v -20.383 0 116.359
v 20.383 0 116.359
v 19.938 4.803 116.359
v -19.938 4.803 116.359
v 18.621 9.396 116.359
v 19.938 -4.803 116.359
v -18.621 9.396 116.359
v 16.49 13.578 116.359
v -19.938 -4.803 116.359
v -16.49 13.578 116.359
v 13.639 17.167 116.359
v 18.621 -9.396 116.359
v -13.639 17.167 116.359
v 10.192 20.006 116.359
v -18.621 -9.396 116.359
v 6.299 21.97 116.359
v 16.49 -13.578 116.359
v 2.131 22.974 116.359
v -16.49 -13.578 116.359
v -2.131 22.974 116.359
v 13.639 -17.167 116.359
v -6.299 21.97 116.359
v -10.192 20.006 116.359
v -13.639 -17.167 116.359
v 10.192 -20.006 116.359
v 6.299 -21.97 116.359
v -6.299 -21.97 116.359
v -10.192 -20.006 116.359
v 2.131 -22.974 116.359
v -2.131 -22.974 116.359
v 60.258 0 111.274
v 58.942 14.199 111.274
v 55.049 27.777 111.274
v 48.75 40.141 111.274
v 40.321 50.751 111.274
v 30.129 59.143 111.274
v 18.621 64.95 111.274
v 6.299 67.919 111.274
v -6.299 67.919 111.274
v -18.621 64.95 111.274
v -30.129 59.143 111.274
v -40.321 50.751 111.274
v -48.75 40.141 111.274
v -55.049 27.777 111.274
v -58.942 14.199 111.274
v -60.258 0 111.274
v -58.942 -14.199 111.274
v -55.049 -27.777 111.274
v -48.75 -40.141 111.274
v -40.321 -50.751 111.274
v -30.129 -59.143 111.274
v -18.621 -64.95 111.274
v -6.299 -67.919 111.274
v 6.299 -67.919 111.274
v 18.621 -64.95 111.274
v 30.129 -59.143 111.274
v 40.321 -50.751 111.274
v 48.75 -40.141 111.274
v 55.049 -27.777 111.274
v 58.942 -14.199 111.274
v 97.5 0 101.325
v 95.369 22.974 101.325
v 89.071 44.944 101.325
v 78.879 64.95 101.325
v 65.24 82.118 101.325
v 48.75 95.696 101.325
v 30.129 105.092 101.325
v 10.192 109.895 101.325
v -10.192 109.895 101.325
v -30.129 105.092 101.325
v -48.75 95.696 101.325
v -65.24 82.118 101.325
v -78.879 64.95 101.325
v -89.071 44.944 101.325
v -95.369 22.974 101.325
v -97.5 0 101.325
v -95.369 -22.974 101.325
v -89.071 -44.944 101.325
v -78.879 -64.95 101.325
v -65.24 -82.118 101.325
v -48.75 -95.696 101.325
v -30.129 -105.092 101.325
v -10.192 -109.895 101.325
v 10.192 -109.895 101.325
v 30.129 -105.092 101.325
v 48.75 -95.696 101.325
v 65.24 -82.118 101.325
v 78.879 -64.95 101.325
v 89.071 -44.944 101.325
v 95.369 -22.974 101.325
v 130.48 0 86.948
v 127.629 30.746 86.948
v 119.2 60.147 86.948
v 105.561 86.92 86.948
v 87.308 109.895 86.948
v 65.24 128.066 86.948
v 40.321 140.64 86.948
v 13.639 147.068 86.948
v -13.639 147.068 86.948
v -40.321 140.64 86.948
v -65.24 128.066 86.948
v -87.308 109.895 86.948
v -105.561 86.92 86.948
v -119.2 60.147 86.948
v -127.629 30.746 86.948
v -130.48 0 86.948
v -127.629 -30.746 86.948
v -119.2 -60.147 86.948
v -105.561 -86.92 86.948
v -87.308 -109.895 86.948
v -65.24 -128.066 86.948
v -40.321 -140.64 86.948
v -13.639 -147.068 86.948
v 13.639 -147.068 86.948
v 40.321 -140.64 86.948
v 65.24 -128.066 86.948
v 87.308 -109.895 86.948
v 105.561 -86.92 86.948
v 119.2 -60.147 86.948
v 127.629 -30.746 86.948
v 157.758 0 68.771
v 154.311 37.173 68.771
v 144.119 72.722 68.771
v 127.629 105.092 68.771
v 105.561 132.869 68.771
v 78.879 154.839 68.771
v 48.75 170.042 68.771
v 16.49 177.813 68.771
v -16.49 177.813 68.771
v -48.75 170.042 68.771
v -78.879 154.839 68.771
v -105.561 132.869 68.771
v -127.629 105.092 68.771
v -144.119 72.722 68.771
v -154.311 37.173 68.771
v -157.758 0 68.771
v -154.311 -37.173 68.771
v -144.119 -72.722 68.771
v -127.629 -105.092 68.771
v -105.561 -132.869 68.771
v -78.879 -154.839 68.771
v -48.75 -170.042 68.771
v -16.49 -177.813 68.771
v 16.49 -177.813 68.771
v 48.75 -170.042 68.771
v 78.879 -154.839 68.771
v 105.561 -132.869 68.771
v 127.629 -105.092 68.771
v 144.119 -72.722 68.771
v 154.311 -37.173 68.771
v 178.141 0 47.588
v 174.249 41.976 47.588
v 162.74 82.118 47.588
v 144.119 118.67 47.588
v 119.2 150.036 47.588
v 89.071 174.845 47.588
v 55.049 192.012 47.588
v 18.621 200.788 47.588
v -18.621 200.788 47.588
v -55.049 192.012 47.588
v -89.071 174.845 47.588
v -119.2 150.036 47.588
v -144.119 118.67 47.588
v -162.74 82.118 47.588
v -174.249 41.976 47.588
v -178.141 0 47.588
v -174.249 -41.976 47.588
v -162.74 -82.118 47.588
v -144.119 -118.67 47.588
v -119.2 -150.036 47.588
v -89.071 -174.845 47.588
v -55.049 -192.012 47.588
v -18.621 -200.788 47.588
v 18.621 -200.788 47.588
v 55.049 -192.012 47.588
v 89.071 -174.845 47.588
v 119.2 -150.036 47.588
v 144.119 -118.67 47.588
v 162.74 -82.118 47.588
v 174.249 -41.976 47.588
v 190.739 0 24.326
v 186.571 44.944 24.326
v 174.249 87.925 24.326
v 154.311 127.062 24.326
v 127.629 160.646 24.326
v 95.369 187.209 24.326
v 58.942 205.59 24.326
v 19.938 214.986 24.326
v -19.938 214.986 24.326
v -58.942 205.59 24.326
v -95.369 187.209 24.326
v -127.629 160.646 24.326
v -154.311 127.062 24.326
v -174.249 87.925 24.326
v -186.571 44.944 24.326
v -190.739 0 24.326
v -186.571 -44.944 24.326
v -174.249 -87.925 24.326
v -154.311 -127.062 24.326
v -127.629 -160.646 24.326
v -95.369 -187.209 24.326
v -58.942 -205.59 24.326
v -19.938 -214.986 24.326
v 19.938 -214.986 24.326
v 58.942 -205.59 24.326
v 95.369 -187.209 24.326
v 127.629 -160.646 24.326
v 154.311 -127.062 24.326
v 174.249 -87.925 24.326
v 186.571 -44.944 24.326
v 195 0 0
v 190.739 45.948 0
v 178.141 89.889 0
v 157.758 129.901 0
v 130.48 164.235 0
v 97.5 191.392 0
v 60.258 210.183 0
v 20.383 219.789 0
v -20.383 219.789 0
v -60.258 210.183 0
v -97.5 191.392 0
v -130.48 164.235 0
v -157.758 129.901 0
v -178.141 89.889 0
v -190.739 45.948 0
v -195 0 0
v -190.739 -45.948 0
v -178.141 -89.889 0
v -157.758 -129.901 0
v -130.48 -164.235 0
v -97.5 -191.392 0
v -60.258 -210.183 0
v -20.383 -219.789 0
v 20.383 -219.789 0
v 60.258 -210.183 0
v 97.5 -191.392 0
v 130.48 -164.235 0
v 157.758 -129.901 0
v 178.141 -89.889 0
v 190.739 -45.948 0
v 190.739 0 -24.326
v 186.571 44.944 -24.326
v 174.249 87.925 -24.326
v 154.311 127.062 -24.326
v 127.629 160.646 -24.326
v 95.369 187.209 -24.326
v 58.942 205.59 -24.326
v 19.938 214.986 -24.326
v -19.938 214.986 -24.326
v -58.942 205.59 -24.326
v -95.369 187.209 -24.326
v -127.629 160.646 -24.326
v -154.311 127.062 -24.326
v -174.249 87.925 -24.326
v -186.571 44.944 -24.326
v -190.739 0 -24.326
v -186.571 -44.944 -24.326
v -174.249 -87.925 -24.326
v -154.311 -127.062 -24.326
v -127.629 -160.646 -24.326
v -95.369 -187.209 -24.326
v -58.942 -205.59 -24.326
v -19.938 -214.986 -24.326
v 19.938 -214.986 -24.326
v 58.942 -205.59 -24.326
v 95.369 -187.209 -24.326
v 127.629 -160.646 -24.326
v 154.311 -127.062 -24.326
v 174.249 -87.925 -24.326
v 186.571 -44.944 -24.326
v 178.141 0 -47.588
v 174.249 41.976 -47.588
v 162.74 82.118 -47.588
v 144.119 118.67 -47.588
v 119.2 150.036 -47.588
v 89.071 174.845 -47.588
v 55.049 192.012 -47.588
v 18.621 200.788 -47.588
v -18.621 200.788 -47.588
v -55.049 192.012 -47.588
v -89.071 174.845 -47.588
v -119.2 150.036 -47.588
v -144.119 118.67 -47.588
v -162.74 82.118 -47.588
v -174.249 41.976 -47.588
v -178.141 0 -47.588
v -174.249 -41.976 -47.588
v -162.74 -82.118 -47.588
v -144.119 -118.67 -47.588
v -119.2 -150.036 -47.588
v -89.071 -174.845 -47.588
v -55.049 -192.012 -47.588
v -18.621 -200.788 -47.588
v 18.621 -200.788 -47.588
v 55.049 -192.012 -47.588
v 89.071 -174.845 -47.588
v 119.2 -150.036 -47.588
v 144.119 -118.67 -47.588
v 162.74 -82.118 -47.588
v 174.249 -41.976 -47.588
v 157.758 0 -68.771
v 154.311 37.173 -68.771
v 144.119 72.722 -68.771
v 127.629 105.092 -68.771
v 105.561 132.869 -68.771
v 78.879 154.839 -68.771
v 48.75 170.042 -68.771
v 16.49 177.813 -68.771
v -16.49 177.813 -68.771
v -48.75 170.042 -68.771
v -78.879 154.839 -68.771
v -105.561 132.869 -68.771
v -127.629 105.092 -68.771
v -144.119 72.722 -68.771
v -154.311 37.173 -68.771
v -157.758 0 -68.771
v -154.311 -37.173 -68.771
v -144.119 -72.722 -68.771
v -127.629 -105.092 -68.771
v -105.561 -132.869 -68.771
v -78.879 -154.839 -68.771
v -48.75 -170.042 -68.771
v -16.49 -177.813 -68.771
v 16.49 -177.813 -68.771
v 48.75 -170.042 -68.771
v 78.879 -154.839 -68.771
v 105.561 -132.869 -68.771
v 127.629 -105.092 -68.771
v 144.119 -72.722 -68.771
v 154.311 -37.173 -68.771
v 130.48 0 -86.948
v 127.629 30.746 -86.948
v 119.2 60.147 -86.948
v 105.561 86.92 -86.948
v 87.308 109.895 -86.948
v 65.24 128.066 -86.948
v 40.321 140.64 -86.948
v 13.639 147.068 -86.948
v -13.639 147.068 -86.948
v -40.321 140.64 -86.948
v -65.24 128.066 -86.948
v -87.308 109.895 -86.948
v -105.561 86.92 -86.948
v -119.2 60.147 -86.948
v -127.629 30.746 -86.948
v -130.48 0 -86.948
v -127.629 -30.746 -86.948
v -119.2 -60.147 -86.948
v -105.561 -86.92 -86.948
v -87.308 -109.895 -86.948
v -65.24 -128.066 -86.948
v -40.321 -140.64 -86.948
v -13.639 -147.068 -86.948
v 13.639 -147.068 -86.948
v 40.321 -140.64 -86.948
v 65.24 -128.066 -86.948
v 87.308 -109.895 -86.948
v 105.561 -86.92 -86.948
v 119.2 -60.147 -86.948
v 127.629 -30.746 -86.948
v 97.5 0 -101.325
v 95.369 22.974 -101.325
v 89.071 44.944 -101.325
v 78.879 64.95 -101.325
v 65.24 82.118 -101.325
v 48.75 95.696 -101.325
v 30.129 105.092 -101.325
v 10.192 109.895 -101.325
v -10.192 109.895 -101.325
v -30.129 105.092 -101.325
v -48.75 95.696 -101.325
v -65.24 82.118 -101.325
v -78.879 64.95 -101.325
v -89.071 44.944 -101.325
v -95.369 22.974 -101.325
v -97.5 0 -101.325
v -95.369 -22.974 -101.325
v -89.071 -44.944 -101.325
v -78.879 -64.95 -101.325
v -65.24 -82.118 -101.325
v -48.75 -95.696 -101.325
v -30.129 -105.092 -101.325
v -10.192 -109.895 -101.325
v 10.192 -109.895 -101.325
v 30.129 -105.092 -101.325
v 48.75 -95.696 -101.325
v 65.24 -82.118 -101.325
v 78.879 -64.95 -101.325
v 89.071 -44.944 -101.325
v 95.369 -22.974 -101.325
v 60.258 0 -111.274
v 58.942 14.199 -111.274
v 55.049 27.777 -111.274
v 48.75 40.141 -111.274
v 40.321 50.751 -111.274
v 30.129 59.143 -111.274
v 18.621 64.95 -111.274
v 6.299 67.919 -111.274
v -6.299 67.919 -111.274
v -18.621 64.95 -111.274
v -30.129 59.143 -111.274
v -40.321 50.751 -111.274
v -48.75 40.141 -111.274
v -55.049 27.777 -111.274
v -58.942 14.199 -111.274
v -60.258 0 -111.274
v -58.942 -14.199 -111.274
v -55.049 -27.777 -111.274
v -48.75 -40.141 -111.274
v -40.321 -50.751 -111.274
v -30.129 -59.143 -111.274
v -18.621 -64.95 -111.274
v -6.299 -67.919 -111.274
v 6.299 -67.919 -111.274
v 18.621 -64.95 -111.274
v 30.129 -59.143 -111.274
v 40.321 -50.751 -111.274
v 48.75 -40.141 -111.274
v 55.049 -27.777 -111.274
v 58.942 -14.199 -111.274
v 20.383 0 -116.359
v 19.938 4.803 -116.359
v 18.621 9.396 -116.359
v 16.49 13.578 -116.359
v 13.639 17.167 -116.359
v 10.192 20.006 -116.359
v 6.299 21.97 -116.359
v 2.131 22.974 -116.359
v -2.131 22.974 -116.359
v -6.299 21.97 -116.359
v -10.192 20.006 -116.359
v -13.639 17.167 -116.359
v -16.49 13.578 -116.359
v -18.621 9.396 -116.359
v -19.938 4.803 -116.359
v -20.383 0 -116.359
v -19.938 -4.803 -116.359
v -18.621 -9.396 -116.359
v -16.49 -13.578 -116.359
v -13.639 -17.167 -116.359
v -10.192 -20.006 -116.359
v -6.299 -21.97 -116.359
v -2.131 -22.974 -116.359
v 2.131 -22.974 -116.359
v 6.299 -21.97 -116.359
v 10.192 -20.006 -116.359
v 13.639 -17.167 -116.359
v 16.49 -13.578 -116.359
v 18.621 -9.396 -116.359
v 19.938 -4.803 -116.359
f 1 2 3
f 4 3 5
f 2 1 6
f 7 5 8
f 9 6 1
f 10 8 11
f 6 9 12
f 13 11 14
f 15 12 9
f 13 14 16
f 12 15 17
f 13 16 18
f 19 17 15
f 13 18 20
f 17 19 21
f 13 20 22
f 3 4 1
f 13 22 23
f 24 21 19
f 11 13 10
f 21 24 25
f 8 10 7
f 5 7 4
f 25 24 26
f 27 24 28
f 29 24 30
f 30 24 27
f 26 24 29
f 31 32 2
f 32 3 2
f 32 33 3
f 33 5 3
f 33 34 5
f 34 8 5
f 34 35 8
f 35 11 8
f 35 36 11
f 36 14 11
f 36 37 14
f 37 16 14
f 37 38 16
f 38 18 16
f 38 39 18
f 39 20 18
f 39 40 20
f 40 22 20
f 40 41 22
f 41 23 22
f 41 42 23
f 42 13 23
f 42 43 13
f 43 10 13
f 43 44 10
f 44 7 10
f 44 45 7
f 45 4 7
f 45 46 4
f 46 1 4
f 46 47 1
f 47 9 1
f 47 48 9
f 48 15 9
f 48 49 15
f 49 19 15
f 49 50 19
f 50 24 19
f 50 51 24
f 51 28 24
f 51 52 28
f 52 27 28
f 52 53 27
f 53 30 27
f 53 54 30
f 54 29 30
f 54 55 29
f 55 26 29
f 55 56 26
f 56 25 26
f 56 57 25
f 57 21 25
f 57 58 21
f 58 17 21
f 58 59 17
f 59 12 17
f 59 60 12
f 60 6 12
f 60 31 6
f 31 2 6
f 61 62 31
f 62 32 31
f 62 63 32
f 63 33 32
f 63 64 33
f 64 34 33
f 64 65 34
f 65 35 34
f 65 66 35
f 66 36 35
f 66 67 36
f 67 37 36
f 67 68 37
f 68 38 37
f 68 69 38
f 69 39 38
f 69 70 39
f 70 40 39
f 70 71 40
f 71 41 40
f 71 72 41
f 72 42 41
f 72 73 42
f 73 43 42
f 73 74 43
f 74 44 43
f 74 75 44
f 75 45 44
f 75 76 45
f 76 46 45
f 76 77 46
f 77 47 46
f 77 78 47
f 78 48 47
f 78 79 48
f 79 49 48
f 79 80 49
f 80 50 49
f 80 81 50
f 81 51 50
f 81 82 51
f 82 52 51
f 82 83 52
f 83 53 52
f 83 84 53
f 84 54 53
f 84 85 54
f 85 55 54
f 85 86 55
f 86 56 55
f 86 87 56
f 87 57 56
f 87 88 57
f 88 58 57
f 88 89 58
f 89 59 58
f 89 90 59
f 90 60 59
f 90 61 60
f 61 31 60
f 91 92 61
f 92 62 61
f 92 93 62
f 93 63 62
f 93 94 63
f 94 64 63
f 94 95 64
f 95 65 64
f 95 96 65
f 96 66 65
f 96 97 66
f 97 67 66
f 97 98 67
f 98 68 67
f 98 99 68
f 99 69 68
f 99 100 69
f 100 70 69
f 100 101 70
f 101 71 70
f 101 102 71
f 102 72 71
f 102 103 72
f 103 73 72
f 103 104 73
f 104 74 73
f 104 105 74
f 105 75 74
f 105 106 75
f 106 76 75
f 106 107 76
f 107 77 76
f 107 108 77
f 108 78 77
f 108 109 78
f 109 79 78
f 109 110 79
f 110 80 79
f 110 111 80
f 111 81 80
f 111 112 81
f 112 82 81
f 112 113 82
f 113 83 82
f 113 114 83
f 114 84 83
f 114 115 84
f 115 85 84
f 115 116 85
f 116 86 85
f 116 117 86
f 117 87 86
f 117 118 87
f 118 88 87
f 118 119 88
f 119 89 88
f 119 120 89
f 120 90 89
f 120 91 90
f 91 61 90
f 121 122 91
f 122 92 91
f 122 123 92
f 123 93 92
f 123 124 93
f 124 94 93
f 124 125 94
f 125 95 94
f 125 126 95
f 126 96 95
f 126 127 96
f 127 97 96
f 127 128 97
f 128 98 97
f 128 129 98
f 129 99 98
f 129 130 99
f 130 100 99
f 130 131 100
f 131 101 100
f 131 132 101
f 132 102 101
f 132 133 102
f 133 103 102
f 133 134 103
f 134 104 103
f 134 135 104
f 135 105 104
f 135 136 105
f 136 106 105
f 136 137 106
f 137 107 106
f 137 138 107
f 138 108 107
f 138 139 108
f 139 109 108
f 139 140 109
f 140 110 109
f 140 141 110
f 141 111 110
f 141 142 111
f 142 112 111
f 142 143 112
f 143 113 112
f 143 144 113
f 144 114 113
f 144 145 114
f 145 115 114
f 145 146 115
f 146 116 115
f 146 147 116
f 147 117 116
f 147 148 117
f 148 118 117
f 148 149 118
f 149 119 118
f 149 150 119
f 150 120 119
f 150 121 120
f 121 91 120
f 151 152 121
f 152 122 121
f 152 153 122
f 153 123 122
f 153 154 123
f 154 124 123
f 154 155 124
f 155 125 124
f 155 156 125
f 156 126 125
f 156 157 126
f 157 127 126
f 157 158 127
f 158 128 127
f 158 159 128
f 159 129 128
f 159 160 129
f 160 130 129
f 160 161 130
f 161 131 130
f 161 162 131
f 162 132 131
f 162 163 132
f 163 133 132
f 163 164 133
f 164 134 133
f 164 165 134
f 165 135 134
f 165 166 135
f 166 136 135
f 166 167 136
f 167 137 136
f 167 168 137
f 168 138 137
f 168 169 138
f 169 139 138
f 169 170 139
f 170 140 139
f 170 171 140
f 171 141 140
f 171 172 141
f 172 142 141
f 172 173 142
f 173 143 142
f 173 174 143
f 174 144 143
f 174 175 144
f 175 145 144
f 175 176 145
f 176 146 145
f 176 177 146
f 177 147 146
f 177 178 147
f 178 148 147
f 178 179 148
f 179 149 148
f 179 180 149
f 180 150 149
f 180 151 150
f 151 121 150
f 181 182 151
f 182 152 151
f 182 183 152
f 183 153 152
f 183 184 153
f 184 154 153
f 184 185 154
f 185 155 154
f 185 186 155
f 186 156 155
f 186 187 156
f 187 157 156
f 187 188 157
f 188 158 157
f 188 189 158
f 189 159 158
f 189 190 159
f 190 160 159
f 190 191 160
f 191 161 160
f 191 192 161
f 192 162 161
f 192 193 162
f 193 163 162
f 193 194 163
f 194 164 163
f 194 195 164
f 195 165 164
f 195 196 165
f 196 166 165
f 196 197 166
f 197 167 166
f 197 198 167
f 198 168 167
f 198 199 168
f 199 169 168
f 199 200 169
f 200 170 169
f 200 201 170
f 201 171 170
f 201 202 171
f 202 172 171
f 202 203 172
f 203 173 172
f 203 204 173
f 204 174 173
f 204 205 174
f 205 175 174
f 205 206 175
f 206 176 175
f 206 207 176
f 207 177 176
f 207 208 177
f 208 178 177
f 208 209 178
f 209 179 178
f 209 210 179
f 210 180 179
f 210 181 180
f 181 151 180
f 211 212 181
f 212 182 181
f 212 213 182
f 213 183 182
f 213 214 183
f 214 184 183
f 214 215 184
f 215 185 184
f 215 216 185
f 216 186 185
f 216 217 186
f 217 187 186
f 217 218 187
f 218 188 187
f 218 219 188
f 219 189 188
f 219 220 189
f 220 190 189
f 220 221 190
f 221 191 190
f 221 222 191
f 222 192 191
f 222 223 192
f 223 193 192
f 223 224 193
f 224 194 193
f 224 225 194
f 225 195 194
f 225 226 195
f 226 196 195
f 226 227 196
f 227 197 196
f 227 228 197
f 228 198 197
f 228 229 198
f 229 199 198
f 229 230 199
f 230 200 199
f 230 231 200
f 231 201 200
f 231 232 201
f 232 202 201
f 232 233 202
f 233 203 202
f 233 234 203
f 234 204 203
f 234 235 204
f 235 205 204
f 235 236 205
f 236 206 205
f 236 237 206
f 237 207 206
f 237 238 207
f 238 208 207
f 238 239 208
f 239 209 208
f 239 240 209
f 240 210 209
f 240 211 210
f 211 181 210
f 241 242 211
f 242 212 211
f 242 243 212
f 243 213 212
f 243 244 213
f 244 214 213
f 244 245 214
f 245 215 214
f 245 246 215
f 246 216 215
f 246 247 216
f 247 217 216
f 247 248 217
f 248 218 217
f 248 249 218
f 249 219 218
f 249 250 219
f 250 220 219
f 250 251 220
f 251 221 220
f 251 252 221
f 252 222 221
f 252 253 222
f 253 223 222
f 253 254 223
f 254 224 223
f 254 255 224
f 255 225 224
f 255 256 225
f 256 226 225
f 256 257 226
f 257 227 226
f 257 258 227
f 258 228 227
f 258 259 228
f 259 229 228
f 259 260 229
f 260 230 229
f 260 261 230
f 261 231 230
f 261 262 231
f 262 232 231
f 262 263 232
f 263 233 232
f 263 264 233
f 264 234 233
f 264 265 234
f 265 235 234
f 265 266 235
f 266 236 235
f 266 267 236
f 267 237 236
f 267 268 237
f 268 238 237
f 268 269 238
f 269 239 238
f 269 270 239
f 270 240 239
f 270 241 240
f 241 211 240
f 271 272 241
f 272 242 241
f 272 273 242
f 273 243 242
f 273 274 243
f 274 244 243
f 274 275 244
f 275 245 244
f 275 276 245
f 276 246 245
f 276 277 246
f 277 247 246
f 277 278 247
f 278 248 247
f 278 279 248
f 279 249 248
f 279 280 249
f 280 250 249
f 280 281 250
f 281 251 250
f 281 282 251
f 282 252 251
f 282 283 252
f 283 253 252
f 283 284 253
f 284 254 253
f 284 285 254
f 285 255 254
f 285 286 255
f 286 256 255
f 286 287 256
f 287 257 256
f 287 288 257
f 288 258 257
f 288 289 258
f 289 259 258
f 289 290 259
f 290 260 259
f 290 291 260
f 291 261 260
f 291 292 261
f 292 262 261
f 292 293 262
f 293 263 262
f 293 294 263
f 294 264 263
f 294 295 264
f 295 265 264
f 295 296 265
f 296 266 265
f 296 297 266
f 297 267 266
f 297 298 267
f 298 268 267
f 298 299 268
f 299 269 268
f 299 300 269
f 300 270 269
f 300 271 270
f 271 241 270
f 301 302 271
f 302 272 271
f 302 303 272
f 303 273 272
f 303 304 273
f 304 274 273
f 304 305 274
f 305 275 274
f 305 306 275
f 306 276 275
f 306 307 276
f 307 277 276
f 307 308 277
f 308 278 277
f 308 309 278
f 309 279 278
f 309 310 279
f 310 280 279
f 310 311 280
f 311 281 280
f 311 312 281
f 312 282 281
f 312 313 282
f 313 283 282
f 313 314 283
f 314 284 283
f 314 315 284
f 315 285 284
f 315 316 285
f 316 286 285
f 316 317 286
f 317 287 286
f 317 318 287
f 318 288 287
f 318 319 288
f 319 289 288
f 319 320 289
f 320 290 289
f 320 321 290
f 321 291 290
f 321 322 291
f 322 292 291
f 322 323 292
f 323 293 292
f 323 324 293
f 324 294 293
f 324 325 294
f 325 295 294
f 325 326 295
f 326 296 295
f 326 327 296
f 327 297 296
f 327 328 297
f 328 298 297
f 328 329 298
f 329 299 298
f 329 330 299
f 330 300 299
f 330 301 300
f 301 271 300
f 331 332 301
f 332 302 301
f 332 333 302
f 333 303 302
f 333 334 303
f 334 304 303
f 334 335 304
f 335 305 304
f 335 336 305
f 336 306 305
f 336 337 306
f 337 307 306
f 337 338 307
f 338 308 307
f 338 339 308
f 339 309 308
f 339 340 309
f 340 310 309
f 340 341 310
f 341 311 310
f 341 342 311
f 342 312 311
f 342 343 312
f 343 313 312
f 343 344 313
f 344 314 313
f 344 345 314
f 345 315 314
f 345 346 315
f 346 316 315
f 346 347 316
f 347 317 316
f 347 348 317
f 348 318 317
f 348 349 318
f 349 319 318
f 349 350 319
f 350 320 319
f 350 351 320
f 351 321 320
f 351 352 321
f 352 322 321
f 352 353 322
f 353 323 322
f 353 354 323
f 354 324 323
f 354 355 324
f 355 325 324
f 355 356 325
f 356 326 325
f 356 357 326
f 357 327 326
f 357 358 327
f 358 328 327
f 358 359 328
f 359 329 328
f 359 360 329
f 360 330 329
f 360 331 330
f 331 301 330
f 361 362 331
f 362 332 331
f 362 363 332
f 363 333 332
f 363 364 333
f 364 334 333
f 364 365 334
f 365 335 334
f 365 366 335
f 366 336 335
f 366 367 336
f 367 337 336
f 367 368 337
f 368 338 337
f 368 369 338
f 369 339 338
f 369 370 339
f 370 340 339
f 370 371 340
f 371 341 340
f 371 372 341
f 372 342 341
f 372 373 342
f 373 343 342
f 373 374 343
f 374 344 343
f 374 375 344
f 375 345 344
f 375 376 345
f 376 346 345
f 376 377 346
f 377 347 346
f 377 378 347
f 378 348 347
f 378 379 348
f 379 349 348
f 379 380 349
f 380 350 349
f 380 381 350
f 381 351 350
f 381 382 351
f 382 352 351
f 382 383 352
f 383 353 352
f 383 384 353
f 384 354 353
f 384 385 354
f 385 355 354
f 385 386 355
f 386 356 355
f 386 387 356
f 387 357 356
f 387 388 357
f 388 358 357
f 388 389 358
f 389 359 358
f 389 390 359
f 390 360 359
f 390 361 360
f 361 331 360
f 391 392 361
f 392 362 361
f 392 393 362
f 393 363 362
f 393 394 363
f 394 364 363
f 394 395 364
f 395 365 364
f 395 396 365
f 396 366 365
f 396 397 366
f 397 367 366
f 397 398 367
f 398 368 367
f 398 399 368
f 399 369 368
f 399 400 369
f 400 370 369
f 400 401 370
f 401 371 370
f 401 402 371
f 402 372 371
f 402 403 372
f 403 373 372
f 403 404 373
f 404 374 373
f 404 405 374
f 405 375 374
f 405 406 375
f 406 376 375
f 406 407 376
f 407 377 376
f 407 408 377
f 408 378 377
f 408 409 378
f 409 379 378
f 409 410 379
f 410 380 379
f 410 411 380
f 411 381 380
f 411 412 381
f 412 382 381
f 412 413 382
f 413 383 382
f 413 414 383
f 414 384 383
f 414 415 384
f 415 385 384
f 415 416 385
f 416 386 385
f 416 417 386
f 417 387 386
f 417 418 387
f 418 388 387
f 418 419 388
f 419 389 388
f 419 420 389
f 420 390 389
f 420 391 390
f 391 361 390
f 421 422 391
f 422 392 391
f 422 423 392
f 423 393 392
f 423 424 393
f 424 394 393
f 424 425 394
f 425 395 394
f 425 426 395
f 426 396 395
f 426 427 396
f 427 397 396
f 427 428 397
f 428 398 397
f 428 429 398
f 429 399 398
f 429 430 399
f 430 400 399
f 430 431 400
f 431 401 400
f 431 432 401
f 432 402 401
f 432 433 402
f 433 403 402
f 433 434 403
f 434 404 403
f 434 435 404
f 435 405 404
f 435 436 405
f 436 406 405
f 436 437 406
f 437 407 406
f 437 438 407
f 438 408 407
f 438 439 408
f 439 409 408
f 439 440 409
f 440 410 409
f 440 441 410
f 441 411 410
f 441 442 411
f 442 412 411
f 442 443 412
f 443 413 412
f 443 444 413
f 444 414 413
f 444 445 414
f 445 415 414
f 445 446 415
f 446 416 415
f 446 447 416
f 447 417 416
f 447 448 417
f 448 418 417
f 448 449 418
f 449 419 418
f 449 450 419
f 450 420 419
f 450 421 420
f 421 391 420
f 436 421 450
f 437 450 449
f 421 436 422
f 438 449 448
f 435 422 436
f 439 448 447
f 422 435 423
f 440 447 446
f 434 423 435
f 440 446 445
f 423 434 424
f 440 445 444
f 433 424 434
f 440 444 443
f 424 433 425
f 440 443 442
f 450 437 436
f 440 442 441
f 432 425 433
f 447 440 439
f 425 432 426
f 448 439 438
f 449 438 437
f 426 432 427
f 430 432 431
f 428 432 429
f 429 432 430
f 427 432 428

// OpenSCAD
// Generated by SolidPython 1.0.1 on 2020-07-29 00:46:52


scale(v = [15, 17, 9]) {
	sphere(r = 13);
}
/***********************************************
*********      SolidPython code:      **********
************************************************
 
# import packages: SolidPython
from solid import *
from solid.utils import *
from itertools import chain, combinations, permutations


class Resize:

    def __init__(self, scad_file):
        self.scad_file = scad_file
        #self.scad_file = import_scad(scad_file)
        # cone/cylinder param:
        self.r1 = 0
        self.r2 = 0
        self.h = 0
        # rectangular prism param:
        self.w = 0
        self.l = 0
        # ellipse param:
        self.r = 0

    # import OpenScad code (file name corresponds to shape)


    # classify shape + parameters
    def assign(self, param1, param2, param3):
        if self.scad_file == 'cone.scad':
            self.r1 = param1
            self.r2 = param2
            self.h = param3
        elif self.scad_file == 'cylinder.scad':
            self.r1 = param1
            self.r2 = param2
            self.h = param3
        elif self.scad_file == 'rectangularPrism.scad':
            self.h = param1
            self.l = param2
            self.w = param3
        else:
            self.r = param1
            self.h = param2

    # resize parameters
    def iterate(self):
        x = range(3, 20, 2)
        i = 1
        if self.scad_file == 'cone.scad':
            tempList = list(permutations(x, 2))
            for temp in tempList:
                param1 = temp[0]
                param2 = temp[1]
                filepath = 'produced_scad_files/' + 'cone' + str(param1) + '_' + str(param2) + '_' + '.scad'
                scad_render_to_file(cylinder(h=param1, r1=param2, r2=0), filepath)

        elif self.scad_file == 'cylinder.scad':
            tempList = list(permutations(x, 3))
            for temp in tempList:
                param1 = temp[0]
                param2 = temp[1]
                filepath = 'produced_scad_files/' + 'cylinder' + str(param1) + '_' + str(param2) + '_' + '.scad'
                scad_render_to_file(cylinder(h=param1, r1=param2, r2=param2), filepath)

        elif self.scad_file == 'rectangularPrism.scad':
            tempList = list(permutations(x, 3))
            for temp in tempList:
                param1 = temp[0]
                param2 = temp[1]
                param3 = temp[2]
                filepath = 'produced_scad_files/' + 'rectangularPrism' + str(param1) + '_' + str(param2) + '_' + str(
                    param3) + '.scad'
                scad_render_to_file(cube(size=(param1, param2, param3)), filepath)

        elif self.scad_file == 'ellipse.scad':
            tempList = list(permutations(x, 4))
            for temp in tempList:
                param1 = temp[0]
                param2 = temp[1]
                param3 = temp[2]
                param4 = temp[3]
                filepath = 'produced_scad_files/' + 'ellipse' + str(param1) + '_' + str(param2) + '_' + str(param3) + '_' + str(param4) + '.scad'
                scad_render_to_file(scale([param1, param2, param3])(sphere(r=param4)), filepath)

    def render_to_scadfile(self):
        scad_render_to_file(scad, 'example.scad') 
 
************************************************/
